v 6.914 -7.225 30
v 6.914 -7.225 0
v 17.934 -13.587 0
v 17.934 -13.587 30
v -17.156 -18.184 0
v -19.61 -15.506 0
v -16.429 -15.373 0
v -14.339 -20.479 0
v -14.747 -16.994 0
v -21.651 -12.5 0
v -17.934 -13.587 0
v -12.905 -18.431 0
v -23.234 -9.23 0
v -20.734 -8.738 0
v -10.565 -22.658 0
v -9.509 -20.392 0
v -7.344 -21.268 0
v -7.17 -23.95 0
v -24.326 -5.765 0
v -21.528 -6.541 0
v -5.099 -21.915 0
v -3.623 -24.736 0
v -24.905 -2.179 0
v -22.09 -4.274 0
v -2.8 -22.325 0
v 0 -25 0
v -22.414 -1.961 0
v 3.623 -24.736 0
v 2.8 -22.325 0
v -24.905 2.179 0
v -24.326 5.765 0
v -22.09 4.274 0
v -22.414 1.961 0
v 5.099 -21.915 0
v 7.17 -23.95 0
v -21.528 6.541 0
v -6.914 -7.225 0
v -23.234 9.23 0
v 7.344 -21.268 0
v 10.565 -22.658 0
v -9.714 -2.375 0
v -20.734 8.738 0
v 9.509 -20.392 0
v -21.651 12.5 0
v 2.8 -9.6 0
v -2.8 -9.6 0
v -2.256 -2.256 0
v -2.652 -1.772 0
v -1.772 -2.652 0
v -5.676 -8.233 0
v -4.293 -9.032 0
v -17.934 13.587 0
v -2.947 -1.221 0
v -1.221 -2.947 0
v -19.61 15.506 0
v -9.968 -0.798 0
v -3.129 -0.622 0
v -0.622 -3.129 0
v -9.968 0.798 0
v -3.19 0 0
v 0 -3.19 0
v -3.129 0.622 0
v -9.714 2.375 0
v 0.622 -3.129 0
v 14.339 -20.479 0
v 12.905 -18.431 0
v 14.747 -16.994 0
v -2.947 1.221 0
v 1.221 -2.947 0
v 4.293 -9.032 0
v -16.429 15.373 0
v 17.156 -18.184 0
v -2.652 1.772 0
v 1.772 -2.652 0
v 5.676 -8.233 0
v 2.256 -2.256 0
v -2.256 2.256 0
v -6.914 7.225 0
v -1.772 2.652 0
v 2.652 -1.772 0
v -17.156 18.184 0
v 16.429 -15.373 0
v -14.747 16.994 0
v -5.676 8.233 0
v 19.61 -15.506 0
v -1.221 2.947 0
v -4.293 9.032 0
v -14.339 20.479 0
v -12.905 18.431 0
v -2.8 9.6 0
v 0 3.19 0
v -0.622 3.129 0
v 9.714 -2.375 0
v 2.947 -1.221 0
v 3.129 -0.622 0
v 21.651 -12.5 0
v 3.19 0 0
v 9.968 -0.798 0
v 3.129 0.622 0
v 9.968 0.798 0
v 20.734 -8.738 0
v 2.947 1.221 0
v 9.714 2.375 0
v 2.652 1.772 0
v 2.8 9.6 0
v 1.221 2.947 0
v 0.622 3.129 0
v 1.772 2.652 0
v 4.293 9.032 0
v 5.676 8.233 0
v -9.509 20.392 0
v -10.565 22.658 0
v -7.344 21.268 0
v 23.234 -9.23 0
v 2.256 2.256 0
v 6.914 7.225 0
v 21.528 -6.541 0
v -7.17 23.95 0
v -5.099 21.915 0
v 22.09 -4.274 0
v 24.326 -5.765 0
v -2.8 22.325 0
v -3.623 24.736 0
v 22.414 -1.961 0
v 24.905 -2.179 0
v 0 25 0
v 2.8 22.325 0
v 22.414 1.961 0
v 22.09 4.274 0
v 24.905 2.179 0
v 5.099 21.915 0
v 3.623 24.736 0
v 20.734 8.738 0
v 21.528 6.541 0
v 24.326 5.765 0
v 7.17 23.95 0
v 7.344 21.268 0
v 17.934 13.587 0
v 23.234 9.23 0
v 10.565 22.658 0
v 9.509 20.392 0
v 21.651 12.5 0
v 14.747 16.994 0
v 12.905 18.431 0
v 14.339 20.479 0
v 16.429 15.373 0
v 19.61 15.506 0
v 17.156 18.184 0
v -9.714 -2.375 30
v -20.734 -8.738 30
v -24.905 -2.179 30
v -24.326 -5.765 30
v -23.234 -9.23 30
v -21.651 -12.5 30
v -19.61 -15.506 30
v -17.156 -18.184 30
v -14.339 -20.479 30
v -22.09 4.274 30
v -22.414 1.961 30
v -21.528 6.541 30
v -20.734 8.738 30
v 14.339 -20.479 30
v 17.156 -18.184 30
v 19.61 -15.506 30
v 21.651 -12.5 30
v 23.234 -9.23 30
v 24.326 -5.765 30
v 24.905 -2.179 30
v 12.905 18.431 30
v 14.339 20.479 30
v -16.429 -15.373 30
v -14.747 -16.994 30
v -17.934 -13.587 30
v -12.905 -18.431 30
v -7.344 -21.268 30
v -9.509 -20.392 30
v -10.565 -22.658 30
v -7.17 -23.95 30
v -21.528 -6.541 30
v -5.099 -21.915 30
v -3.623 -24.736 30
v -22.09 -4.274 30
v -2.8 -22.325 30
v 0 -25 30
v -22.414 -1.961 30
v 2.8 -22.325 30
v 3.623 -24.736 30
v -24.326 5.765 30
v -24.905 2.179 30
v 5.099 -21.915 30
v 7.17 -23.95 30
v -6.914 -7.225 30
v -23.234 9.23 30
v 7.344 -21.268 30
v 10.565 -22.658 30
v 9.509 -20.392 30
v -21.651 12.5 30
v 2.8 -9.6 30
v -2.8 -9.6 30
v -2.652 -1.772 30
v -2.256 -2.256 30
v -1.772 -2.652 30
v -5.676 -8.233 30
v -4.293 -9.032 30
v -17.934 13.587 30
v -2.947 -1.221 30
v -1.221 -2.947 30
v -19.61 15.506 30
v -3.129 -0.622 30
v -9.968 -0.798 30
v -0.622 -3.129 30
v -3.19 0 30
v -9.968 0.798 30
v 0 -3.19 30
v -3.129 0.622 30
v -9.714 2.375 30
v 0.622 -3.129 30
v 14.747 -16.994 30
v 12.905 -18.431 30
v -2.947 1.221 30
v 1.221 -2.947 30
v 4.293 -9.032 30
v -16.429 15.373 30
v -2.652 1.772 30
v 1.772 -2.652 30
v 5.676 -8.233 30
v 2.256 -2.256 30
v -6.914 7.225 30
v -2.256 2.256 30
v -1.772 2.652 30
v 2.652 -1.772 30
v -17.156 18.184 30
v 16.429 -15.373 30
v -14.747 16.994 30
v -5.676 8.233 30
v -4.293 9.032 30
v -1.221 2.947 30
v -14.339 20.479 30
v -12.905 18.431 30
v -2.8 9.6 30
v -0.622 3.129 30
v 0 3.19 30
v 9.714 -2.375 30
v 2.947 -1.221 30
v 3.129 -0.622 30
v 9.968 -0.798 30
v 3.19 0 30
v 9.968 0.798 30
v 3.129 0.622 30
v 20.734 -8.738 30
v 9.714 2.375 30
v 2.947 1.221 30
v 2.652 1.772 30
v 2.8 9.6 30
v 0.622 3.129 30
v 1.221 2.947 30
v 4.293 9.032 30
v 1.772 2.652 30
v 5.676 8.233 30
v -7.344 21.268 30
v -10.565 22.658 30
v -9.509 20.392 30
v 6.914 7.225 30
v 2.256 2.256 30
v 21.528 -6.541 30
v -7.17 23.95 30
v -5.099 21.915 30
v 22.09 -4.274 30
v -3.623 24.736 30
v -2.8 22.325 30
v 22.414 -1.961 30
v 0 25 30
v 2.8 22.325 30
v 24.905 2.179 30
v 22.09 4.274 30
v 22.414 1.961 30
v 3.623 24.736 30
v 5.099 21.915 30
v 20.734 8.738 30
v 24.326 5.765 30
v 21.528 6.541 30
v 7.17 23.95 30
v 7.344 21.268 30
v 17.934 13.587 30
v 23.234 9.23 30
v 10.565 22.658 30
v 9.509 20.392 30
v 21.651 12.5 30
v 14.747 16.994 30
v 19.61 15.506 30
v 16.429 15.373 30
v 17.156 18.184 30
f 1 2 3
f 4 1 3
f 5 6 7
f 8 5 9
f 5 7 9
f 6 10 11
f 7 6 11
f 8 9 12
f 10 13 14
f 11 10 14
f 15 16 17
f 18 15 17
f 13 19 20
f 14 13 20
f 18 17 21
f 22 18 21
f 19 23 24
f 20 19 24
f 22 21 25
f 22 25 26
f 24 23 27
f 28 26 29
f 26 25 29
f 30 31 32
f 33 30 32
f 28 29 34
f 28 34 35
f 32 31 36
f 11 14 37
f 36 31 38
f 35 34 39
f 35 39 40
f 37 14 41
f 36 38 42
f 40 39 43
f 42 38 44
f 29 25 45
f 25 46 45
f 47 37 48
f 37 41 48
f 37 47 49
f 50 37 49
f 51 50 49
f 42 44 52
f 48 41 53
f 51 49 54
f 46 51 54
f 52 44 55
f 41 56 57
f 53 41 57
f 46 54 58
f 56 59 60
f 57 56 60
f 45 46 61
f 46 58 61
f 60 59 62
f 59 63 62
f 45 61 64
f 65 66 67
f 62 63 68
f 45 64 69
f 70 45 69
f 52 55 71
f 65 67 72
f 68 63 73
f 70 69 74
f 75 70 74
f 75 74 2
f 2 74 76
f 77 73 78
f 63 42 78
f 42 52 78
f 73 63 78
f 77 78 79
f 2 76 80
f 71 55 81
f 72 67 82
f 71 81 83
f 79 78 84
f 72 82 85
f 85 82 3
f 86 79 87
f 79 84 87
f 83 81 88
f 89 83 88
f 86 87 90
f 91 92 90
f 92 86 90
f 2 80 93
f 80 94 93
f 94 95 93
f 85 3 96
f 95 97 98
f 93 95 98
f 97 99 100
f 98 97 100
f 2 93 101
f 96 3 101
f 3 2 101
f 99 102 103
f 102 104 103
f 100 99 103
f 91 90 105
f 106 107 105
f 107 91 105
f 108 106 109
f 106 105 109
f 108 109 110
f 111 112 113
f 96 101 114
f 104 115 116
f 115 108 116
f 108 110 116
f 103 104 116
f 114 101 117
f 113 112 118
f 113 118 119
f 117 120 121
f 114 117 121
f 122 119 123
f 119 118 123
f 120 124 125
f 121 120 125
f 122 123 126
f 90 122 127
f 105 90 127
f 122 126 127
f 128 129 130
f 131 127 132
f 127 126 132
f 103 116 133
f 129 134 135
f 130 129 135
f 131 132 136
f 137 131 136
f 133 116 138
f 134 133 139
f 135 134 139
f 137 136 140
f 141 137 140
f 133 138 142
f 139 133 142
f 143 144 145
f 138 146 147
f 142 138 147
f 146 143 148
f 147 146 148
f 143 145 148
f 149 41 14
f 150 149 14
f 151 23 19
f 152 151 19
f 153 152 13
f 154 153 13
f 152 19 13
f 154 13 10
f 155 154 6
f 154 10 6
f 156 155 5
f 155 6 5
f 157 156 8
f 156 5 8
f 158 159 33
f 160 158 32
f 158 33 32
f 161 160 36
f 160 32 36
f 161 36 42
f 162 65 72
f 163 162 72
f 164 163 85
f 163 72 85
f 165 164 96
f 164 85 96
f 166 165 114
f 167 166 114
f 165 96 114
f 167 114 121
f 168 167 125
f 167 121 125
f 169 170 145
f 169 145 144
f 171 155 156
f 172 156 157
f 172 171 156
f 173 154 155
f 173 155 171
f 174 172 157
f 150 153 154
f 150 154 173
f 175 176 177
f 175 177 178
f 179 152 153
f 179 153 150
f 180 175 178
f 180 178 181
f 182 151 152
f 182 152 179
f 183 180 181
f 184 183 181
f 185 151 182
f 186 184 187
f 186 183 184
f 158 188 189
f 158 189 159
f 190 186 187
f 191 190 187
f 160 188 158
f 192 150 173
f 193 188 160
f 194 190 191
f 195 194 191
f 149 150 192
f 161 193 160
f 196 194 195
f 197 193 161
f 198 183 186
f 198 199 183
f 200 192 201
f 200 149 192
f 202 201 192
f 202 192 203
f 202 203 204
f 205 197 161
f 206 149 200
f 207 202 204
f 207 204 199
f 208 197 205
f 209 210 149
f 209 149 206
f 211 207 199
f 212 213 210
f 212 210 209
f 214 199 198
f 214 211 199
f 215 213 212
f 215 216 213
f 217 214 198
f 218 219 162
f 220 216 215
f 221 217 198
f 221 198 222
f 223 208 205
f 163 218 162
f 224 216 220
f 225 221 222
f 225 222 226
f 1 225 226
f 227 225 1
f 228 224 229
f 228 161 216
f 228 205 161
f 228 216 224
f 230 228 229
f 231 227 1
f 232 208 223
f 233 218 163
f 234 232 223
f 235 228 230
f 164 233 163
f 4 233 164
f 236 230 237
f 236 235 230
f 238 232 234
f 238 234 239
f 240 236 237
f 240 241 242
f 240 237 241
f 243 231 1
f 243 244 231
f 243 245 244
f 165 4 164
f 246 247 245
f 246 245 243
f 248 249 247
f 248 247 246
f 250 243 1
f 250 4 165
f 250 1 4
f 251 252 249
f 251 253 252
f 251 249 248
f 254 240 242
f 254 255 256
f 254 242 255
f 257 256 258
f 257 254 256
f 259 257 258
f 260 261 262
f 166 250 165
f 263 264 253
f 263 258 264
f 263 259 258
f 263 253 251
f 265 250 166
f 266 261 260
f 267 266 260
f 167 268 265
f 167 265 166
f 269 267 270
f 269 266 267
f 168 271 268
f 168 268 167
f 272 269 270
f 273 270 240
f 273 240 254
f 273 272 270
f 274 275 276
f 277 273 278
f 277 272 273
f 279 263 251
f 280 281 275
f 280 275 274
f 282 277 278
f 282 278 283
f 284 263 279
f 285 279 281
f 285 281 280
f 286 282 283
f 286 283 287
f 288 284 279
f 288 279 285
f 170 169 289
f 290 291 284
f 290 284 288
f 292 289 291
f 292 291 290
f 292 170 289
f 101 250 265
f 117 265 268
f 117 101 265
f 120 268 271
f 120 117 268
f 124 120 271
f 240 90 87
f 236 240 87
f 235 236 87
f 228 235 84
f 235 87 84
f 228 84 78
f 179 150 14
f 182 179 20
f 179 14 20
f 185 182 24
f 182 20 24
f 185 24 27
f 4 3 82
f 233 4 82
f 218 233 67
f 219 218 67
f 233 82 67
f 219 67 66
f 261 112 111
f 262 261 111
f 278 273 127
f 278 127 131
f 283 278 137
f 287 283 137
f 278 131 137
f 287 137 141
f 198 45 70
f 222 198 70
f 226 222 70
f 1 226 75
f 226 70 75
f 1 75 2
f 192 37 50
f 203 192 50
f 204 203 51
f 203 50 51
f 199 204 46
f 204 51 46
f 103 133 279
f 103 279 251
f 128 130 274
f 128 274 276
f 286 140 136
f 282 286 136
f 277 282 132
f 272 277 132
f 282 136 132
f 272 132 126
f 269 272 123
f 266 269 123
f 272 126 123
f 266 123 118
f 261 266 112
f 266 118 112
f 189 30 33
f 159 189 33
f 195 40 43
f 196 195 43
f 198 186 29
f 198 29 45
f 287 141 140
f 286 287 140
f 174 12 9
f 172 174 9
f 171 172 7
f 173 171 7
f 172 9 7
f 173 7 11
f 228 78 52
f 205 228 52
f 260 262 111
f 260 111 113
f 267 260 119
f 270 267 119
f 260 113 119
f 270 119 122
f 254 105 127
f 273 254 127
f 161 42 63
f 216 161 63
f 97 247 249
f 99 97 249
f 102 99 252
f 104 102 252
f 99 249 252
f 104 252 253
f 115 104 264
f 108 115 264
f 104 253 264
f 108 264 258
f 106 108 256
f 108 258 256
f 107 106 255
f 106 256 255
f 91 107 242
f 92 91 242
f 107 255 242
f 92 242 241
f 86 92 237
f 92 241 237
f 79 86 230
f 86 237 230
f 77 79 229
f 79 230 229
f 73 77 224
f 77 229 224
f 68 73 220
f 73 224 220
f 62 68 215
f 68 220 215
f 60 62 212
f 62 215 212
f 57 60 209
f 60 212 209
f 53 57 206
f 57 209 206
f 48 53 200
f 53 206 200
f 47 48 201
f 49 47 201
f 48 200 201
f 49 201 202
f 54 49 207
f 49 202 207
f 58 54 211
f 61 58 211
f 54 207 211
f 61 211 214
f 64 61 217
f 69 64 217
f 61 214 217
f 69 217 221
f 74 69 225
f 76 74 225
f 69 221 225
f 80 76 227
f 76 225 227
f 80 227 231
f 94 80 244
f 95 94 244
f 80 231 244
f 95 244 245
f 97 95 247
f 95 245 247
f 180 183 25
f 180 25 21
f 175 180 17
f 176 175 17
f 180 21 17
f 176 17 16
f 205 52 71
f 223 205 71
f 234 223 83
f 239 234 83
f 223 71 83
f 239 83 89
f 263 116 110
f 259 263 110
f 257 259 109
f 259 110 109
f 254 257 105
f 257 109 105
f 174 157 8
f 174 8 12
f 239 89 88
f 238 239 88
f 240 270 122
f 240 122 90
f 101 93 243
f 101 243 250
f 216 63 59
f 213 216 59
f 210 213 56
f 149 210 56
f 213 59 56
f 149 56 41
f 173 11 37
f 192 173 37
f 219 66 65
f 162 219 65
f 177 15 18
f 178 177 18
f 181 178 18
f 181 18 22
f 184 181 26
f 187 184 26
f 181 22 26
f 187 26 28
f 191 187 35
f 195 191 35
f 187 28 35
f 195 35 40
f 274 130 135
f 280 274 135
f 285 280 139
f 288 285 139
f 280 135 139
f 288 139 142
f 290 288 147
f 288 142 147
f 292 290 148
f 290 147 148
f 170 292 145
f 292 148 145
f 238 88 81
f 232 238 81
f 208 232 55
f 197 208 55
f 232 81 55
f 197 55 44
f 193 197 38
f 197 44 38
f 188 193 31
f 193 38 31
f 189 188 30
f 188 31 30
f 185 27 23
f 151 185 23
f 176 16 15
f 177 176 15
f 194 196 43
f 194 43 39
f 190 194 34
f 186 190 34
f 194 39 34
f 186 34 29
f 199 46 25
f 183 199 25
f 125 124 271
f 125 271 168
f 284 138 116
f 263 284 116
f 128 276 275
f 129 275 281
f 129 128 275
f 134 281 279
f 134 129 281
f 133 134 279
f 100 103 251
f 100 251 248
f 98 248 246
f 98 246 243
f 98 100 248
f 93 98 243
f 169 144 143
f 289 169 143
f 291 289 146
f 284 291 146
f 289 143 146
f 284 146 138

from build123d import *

# Parameters (mm, degrees)
SKETCH2_R           = 25
BOSS_EXTRUDE2_DEPTH = 30
CUT_EXTRUDE2_START  = -30
CUT_EXTRUDE2_DEPTH  = 30
SKETCH4_R           = 3.19
CUT_EXTRUDE3_DEPTH  = 30


with BuildPart() as part:
    # Sketch2 → Boss-Extrude2 (new body)
    with BuildSketch(Plane.XY):
        Circle(SKETCH2_R)
    extrude(amount=BOSS_EXTRUDE2_DEPTH)

    # Sketch3 → Cut-Extrude2 (cut)
    with BuildSketch(Plane.XY.offset(30).offset(CUT_EXTRUDE2_START)):
        with BuildLine():
            Line((6.913843876, -7.224871131), (17.934101996, -13.587420123))
            ThreePointArc((17.934101996, -13.587420123), (15.608801126, -16.205410436), (12.905469818, -18.430920997))
            Line((12.905469818, -18.430920997), (14.339410909, -20.478801107))
            ThreePointArc((14.339410909, -20.478801107), (12.5, -21.650635095), (10.565456544, -22.657694676))
            Line((10.565456544, -22.657694676), (9.508910889, -20.391925208))
            ThreePointArc((9.508910889, -20.391925208), (6.229896553, -21.620323516), (2.8, -22.325097984))
            Line((2.8, -22.325097984), (2.8, -9.6))
            ThreePointArc((2.8, -9.6), (5, -8.660254038), (6.913843876, -7.224871131))
        make_face()
        with BuildLine():
            Line((9.713843876, -2.375128869), (20.734101996, -8.737677861))
            ThreePointArc((20.734101996, -8.737677861), (21.83869768, -5.41491308), (22.414380707, -1.961004212))
            Line((22.414380707, -1.961004212), (24.904867452, -2.178893569))
            ThreePointArc((24.904867452, -2.178893569), (25, 0), (24.904867452, 2.178893569))
            Line((24.904867452, 2.178893569), (22.414380707, 1.961004212))
            ThreePointArc((22.414380707, 1.961004212), (21.83869768, 5.41491308), (20.734101996, 8.737677861))
            Line((20.734101996, 8.737677861), (9.713843876, 2.375128869))
            ThreePointArc((9.713843876, 2.375128869), (10, 0), (9.713843876, -2.375128869))
        make_face()
        with BuildLine():
            Line((-2.8, -9.6), (-2.8, -22.325097984))
            ThreePointArc((-2.8, -22.325097984), (-6.229896553, -21.620323516), (-9.508910889, -20.391925208))
            Line((-9.508910889, -20.391925208), (-10.565456544, -22.657694676))
            ThreePointArc((-10.565456544, -22.657694676), (-12.5, -21.650635095), (-14.339410909, -20.478801107))
            Line((-14.339410909, -20.478801107), (-12.905469818, -18.430920997))
            ThreePointArc((-12.905469818, -18.430920997), (-15.608801126, -16.205410436), (-17.934101996, -13.587420123))
            Line((-17.934101996, -13.587420123), (-6.913843876, -7.224871131))
            ThreePointArc((-6.913843876, -7.224871131), (-5, -8.660254038), (-2.8, -9.6))
        make_face()
        with BuildLine():
            Line((-9.713843876, -2.375128869), (-20.734101996, -8.737677861))
            ThreePointArc((-20.734101996, -8.737677861), (-21.83869768, -5.41491308), (-22.414380707, -1.961004212))
            Line((-22.414380707, -1.961004212), (-24.904867452, -2.178893569))
            ThreePointArc((-24.904867452, -2.178893569), (-25, 0), (-24.904867452, 2.178893569))
            Line((-24.904867452, 2.178893569), (-22.414380707, 1.961004212))
            ThreePointArc((-22.414380707, 1.961004212), (-21.83869768, 5.41491308), (-20.734101996, 8.737677861))
            Line((-20.734101996, 8.737677861), (-9.713843876, 2.375128869))
            ThreePointArc((-9.713843876, 2.375128869), (-10, 0), (-9.713843876, -2.375128869))
        make_face()
        with BuildLine():
            Line((-6.913843876, 7.224871131), (-17.934101996, 13.587420123))
            ThreePointArc((-17.934101996, 13.587420123), (-15.608801126, 16.205410436), (-12.905469818, 18.430920997))
            Line((-12.905469818, 18.430920997), (-14.339410909, 20.478801107))
            ThreePointArc((-14.339410909, 20.478801107), (-12.5, 21.650635095), (-10.565456544, 22.657694676))
            Line((-10.565456544, 22.657694676), (-9.508910889, 20.391925208))
            ThreePointArc((-9.508910889, 20.391925208), (-6.229896553, 21.620323516), (-2.8, 22.325097984))
            Line((-2.8, 22.325097984), (-2.8, 9.6))
            ThreePointArc((-2.8, 9.6), (-5, 8.660254038), (-6.913843876, 7.224871131))
        make_face()
        with BuildLine():
            Line((2.8, 9.6), (2.8, 22.325097984))
            ThreePointArc((2.8, 22.325097984), (6.229896553, 21.620323516), (9.508910889, 20.391925208))
            Line((9.508910889, 20.391925208), (10.565456544, 22.657694676))
            ThreePointArc((10.565456544, 22.657694676), (12.5, 21.650635095), (14.339410909, 20.478801107))
            Line((14.339410909, 20.478801107), (12.905469818, 18.430920997))
            ThreePointArc((12.905469818, 18.430920997), (15.608801126, 16.205410436), (17.934101996, 13.587420123))
            Line((17.934101996, 13.587420123), (6.913843876, 7.224871131))
            ThreePointArc((6.913843876, 7.224871131), (5, 8.660254038), (2.8, 9.6))
        make_face()
    extrude(amount=CUT_EXTRUDE2_DEPTH, mode=Mode.SUBTRACT)

    # Sketch4 → Cut-Extrude3 (cut)
    with BuildSketch(Plane.XY.offset(30)):
        Circle(SKETCH4_R)
    extrude(amount=-CUT_EXTRUDE3_DEPTH, mode=Mode.SUBTRACT)


solid = part.part
